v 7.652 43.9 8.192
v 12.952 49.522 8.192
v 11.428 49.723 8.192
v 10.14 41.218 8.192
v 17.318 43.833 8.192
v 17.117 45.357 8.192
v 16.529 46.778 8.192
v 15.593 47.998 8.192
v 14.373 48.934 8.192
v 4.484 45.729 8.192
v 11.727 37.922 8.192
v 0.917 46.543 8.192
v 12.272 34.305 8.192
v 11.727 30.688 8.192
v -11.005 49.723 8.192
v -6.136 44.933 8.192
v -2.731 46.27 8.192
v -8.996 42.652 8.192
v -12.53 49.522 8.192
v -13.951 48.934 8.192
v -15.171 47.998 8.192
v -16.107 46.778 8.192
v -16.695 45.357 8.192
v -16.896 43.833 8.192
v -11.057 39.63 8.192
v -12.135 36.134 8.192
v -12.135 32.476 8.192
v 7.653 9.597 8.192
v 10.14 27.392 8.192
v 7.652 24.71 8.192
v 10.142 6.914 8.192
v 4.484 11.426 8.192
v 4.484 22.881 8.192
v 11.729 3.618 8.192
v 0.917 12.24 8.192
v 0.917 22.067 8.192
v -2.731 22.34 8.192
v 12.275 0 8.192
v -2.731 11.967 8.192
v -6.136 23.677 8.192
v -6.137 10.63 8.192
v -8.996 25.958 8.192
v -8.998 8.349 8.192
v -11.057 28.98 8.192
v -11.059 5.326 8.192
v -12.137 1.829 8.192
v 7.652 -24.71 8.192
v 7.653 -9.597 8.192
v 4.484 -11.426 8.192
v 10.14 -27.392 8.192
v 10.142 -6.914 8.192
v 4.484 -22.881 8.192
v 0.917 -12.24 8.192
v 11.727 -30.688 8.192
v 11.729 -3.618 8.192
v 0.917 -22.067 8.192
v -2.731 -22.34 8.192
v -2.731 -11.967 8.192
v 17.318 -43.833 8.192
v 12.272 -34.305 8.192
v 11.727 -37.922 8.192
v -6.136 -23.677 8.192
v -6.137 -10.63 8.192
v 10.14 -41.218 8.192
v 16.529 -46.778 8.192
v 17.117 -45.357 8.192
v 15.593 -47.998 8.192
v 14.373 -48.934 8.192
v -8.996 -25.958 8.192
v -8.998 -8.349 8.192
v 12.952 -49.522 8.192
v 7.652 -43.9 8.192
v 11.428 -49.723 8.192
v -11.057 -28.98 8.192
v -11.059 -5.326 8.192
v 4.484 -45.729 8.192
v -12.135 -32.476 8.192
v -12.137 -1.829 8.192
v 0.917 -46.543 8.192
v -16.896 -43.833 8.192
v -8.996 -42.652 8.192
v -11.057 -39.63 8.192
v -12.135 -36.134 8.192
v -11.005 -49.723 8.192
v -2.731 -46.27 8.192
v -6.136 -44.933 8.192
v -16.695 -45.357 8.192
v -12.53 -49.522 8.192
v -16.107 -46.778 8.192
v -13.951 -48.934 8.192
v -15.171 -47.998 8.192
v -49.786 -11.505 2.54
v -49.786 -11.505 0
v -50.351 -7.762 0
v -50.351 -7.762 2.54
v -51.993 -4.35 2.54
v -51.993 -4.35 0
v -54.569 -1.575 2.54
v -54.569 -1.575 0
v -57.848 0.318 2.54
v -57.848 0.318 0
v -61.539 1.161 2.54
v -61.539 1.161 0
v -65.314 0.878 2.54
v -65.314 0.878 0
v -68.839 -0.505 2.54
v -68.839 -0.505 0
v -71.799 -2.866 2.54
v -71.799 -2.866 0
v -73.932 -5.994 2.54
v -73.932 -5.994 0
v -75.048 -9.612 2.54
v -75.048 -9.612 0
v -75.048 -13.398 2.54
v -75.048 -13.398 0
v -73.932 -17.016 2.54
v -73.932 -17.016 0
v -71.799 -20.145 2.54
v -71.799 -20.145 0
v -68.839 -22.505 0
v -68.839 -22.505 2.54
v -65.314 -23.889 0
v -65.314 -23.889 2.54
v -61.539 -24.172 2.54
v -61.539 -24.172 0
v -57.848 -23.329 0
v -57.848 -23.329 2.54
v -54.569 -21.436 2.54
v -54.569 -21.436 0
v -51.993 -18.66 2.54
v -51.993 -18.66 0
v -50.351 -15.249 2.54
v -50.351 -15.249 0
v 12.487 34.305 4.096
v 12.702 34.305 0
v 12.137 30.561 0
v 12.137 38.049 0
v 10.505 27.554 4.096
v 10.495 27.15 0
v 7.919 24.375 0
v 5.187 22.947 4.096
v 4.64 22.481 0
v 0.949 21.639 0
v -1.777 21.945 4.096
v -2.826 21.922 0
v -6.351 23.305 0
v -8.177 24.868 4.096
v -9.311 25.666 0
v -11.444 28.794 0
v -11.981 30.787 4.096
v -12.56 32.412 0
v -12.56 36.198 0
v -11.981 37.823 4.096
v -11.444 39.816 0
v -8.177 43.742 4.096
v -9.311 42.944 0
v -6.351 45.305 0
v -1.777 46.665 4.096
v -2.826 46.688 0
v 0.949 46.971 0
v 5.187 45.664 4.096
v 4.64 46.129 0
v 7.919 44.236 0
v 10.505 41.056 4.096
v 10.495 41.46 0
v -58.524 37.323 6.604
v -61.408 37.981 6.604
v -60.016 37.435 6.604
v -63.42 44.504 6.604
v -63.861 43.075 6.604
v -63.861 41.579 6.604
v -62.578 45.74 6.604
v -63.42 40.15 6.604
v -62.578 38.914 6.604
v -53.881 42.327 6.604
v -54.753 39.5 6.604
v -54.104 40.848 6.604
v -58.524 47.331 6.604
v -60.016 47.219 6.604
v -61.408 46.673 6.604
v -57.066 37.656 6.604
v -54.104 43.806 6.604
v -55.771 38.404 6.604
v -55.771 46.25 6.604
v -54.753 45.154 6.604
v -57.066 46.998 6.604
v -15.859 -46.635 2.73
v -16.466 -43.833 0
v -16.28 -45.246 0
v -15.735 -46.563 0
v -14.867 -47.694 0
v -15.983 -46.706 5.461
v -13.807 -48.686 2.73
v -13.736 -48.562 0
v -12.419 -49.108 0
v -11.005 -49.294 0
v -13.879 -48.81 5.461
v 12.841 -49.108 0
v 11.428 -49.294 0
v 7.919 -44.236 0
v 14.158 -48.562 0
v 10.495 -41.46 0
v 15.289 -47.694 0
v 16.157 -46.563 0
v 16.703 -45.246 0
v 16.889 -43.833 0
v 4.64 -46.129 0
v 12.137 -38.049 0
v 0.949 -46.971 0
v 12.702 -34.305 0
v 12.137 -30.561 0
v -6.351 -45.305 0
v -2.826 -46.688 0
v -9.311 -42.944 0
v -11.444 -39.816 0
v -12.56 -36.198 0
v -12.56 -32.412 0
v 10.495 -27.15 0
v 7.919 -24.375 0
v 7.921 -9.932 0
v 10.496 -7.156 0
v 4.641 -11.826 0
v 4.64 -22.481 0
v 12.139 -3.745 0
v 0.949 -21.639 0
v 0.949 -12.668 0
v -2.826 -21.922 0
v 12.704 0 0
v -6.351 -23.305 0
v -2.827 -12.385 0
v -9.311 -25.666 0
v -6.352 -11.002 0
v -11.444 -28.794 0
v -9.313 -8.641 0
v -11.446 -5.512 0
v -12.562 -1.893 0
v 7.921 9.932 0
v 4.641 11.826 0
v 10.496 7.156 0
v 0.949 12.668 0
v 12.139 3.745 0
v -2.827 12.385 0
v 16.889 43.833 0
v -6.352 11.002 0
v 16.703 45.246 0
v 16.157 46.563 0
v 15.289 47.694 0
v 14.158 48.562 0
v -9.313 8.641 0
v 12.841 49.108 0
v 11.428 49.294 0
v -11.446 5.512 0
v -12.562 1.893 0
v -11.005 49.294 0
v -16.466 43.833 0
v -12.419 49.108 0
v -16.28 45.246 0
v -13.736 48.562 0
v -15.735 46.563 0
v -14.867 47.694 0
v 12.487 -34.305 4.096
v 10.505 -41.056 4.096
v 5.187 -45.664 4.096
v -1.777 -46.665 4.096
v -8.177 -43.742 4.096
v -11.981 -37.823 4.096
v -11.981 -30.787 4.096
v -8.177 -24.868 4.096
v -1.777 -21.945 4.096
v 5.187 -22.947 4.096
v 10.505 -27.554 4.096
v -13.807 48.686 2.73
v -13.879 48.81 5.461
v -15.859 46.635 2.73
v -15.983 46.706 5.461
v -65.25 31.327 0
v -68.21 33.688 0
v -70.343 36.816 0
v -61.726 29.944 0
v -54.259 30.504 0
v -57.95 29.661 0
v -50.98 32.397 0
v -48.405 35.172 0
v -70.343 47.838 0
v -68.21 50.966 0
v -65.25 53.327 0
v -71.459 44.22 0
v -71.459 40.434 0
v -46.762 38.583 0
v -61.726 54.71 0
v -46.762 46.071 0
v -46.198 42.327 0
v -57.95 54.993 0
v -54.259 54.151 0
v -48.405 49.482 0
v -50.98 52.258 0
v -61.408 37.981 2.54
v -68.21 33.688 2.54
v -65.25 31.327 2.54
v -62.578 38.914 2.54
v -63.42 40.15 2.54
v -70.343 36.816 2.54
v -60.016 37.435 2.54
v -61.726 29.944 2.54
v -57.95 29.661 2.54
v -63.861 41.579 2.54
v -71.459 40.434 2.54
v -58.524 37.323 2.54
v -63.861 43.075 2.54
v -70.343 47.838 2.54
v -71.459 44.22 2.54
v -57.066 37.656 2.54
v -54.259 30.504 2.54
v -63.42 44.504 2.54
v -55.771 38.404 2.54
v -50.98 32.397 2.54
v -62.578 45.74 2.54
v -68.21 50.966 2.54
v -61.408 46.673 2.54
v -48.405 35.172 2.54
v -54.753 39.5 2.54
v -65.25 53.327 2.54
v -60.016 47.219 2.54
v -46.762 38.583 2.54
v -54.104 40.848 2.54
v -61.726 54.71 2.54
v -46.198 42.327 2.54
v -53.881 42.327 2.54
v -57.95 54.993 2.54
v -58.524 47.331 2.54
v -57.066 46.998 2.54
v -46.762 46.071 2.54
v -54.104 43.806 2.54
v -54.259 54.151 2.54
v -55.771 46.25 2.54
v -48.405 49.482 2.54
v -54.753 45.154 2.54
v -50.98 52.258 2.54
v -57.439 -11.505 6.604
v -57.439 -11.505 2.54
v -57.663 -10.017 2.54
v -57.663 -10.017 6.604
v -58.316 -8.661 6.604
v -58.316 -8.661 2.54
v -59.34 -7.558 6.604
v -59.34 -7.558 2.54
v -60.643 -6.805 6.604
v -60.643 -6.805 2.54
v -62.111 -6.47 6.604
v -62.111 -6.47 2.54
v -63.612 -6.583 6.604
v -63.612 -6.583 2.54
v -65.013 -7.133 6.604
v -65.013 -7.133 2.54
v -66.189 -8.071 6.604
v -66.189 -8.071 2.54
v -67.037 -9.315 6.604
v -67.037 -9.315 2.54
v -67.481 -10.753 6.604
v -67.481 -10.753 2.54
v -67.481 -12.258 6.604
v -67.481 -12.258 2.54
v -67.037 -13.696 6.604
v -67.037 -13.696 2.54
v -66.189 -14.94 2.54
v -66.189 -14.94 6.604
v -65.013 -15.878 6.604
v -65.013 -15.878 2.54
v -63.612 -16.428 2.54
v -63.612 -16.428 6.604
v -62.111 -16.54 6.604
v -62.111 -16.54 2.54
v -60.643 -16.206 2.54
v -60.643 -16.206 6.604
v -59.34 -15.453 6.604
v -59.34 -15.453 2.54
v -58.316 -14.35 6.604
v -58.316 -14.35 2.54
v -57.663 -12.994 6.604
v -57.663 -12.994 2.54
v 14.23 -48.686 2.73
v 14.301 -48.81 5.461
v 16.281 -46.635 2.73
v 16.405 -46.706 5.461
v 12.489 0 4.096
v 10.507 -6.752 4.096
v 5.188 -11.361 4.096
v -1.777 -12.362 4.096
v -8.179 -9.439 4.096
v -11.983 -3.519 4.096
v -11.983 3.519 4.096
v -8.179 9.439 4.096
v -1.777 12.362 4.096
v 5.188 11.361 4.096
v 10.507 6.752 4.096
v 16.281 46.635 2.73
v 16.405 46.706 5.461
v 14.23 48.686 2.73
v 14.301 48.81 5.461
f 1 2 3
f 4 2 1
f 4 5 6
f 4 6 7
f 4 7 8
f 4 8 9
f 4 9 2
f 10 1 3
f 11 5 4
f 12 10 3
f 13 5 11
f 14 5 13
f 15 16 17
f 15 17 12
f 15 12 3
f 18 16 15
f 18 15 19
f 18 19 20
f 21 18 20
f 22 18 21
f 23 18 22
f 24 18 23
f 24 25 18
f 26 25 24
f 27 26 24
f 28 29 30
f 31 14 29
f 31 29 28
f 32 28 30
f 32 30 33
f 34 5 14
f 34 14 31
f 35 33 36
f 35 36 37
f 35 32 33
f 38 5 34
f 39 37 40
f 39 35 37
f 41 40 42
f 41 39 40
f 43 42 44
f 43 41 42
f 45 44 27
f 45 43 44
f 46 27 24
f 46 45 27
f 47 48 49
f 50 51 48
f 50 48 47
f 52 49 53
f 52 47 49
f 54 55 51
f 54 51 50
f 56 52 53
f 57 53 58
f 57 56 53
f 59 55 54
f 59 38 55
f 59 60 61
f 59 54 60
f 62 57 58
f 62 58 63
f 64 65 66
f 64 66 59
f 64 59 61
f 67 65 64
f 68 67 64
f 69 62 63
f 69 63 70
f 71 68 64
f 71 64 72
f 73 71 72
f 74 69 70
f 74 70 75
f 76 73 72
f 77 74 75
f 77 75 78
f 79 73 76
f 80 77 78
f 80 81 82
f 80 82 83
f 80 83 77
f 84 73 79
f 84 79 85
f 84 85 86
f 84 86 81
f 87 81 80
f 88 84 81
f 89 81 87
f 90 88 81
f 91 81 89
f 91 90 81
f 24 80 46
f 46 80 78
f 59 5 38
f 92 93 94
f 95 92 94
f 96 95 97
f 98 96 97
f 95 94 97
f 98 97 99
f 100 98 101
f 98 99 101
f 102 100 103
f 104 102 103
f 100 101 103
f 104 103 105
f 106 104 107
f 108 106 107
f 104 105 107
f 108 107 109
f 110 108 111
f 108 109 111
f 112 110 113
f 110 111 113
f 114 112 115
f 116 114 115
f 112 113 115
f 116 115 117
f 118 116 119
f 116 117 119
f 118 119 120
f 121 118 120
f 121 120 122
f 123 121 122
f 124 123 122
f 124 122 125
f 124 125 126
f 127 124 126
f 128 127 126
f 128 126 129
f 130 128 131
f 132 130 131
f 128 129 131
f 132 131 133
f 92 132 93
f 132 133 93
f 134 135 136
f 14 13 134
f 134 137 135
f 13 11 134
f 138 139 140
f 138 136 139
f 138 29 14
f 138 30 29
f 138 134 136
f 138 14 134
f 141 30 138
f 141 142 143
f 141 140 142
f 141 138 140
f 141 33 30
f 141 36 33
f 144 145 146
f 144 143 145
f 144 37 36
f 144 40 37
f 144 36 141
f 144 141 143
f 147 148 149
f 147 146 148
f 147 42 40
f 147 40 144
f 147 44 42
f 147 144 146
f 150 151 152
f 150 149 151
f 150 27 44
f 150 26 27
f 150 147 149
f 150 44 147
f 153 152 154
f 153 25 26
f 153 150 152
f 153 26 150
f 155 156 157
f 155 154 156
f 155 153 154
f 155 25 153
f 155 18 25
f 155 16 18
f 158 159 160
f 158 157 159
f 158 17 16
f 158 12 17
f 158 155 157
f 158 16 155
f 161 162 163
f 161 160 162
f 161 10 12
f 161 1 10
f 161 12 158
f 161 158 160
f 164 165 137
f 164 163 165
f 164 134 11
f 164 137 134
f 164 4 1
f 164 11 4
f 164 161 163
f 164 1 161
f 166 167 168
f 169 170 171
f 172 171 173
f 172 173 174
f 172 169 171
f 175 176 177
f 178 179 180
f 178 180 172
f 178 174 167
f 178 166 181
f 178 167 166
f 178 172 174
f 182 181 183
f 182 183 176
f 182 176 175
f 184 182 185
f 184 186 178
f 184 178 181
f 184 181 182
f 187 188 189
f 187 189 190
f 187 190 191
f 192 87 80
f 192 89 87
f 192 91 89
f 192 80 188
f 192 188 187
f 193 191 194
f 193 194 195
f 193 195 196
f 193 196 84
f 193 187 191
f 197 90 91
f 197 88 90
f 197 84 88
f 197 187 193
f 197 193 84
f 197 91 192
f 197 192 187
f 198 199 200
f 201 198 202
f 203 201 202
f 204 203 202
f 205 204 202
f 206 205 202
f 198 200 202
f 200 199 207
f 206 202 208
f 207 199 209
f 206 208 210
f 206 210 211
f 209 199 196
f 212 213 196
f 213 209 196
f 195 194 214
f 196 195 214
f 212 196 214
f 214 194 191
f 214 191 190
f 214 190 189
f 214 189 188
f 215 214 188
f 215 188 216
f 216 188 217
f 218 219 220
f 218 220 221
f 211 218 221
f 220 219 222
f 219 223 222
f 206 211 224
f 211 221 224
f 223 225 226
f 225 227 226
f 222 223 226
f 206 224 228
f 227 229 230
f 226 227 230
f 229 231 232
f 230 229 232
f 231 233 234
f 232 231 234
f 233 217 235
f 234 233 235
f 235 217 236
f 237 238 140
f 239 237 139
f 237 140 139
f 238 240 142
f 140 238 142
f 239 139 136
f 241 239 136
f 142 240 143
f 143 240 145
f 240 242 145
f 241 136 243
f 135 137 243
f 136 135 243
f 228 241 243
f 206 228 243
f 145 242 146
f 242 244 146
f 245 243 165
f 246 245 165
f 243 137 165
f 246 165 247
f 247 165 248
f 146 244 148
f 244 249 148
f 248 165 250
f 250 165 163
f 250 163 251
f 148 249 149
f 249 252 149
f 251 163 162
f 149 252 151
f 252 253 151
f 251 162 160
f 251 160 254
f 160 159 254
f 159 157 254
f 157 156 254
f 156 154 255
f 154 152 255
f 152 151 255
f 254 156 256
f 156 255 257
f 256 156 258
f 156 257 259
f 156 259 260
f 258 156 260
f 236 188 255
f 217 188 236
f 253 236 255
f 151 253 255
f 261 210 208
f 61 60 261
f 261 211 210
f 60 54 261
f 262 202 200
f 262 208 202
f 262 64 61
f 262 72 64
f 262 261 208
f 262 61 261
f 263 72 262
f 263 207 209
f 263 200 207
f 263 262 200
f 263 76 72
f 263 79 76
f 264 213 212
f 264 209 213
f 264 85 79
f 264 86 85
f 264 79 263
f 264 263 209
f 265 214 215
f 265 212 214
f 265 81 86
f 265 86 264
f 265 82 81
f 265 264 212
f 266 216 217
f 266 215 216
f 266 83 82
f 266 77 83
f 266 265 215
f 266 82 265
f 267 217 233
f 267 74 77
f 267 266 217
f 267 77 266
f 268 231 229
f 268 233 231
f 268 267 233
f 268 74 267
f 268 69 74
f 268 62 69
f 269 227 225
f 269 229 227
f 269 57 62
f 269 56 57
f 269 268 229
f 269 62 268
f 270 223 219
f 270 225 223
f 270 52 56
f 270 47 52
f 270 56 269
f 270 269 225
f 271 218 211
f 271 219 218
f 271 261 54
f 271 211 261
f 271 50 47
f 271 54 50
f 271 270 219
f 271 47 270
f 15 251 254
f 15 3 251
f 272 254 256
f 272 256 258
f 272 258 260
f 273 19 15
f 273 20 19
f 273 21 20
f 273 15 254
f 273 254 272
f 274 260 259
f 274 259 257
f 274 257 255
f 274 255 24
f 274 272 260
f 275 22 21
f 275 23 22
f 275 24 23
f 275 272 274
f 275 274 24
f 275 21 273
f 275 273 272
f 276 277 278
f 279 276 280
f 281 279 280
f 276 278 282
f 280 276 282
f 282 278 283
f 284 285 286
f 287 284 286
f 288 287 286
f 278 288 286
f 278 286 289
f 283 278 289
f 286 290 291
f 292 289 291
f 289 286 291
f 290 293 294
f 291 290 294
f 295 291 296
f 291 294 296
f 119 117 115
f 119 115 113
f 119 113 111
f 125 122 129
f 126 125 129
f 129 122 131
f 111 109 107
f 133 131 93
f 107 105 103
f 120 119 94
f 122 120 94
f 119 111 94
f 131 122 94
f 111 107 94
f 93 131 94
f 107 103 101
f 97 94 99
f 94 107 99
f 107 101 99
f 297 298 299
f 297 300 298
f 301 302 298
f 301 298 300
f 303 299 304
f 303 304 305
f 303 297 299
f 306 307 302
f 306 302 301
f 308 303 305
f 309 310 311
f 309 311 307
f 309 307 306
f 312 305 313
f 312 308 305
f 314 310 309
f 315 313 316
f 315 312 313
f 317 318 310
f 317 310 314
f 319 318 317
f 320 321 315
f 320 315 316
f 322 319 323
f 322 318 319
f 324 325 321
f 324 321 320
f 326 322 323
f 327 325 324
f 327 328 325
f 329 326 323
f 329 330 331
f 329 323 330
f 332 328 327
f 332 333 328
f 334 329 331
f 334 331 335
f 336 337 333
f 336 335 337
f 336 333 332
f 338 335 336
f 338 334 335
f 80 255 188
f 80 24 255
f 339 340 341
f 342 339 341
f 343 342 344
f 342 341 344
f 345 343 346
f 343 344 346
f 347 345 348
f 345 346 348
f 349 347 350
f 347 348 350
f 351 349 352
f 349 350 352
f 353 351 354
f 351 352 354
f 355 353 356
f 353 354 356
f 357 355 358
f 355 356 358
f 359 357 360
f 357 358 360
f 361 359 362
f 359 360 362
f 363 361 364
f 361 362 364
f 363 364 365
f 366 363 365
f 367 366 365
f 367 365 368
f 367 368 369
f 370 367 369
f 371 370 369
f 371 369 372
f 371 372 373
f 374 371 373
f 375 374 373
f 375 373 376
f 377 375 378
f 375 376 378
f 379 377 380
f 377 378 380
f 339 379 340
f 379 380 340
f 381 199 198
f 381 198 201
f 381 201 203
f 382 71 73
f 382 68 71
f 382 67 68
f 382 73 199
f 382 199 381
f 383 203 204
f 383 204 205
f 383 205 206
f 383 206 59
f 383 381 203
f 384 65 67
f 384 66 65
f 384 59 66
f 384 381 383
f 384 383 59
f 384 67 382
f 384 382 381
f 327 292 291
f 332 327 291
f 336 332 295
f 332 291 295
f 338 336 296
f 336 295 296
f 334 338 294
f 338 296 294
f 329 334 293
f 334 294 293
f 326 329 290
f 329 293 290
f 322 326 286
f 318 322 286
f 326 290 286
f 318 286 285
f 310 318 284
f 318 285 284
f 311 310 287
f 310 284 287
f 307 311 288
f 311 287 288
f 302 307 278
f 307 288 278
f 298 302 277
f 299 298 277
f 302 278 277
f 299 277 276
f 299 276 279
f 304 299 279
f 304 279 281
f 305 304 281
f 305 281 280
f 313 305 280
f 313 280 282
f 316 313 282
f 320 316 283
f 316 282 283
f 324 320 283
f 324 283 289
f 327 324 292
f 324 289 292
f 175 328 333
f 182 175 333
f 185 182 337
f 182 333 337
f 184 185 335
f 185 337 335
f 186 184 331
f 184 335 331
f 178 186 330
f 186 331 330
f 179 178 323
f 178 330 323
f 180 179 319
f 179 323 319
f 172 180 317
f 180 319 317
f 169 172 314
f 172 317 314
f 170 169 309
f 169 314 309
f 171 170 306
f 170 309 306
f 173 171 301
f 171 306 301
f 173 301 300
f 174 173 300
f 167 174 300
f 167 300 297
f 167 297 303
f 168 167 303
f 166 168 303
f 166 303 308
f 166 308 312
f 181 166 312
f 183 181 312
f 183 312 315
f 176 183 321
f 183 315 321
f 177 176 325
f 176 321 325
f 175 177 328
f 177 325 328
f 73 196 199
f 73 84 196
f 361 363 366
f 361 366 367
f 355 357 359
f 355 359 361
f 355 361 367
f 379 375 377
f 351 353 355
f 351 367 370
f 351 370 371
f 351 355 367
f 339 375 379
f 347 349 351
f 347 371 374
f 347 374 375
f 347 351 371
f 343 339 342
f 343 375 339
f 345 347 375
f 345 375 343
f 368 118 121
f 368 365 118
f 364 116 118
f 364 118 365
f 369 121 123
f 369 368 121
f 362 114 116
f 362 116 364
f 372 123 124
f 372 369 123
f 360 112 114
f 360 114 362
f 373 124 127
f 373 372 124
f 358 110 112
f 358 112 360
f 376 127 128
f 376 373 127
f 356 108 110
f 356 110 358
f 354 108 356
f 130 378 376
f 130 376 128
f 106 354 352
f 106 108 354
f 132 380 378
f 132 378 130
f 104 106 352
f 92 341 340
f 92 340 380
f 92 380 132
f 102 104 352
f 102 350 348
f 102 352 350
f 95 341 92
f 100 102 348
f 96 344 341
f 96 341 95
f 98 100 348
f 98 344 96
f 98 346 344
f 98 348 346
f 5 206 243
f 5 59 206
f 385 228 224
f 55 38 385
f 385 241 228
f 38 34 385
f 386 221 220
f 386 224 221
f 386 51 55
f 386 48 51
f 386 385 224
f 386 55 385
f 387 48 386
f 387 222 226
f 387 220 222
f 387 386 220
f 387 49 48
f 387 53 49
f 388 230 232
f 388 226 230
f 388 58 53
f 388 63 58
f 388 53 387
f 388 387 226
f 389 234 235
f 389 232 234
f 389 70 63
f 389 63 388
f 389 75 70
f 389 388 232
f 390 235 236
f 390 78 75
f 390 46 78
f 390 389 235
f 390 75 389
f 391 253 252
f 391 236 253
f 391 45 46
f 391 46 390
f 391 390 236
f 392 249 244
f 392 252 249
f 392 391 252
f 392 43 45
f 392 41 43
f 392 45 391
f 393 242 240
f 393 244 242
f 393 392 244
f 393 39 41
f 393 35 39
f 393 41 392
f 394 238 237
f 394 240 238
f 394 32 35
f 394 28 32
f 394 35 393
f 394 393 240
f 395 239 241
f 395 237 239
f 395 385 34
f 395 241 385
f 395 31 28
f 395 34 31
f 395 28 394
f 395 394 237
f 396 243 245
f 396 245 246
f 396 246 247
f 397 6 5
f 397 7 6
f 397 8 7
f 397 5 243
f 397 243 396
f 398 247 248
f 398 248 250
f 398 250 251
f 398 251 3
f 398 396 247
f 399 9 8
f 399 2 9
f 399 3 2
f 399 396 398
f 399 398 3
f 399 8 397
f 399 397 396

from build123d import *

# Parameters (mm, degrees)
F0_R     = 12.7016265203
F0_R_2   = 12.7038195685
F1_DEPTH = 8.1915
F1_TAPER = -3
F2_R     = 12.701626737
F3_DEPTH = 2.54
F2_R_2   = 12.7016276039
F4_R     = 5.0491582817
F5_DEPTH = 4.064
F6_R     = 5.0179830383
F7_DEPTH = 4.064


with BuildPart() as f1:
    # F0 (on Top) → F1 (new body)
    with BuildSketch(Plane.XY):
        with BuildLine():
            Line((-16.4664387703, 43.8327639356), (-16.4664387703, 21.216372028))
            Line((-16.4664387703, 21.216372028), (-16.4664387703, -21.216372028))
            Line((-16.4664387703, -21.216372028), (-16.4664387703, -43.8327639356))
            ThreePointArc((-16.4664387703, -43.8327639356), (-14.8669489024, -47.6942740676), (-11.0054387703, -49.2937639356))
            Line((-11.0054387703, -49.2937639356), (11.4276575848, -49.2937639356))
            ThreePointArc((11.4276575848, -49.2937639356), (15.2891677168, -47.6942740676), (16.8886575848, -43.8327639356))
            Line((16.8886575848, -43.8327639356), (16.8886575848, -21.216372028))
            Line((16.8886575848, -21.216372028), (16.8886575848, 21.216372028))
            Line((16.8886575848, 21.216372028), (16.8886575848, 43.8327639356))
            ThreePointArc((16.8886575848, 43.8327639356), (15.2891677168, 47.6942740676), (11.4276575848, 49.2937639356))
            Line((11.4276575848, 49.2937639356), (-11.0054387703, 49.2937639356))
            ThreePointArc((-11.0054387703, 49.2937639356), (-14.8669489024, 47.6942740676), (-16.4664387703, 43.8327639356))
        make_face()
        with Locations((0, -34.3050807714)):
            Circle(F0_R, mode=Mode.SUBTRACT)
        Circle(F0_R_2, mode=Mode.SUBTRACT)
        with Locations((0, 34.3050807714)):
            Circle(F0_R, mode=Mode.SUBTRACT)
    extrude(amount=F1_DEPTH, taper=F1_TAPER)


with BuildPart() as f3:
    # F2 (on Top) → F3 (new body)
    with BuildSketch(Plane.XY):
        with Locations((-62.4880231917, -11.5053961053)):
            Circle(F2_R)
    extrude(amount=F3_DEPTH)

    # F4 (on face) → F5 (join)
    with BuildSketch(Plane.XY.offset(2.54)):
        with Locations((-62.4880231917, -11.5053961053)):
            Circle(F4_R)
    extrude(amount=F5_DEPTH)


with BuildPart() as f3b:
    # F2 (on Top) → F3, piece 2 (new body)
    with BuildSketch(Plane.XY):
        with Locations((-58.8991828263, 42.3271916807)):
            Circle(F2_R_2)
    extrude(amount=F3_DEPTH)

    # F6 (on face) → F7 (join)
    with BuildSketch(Plane.XY.offset(2.54)):
        with Locations((-58.8991828263, 42.3271916807)):
            Circle(F6_R)
    extrude(amount=F7_DEPTH)


solid = Compound([f1.part, f3.part, f3b.part])
